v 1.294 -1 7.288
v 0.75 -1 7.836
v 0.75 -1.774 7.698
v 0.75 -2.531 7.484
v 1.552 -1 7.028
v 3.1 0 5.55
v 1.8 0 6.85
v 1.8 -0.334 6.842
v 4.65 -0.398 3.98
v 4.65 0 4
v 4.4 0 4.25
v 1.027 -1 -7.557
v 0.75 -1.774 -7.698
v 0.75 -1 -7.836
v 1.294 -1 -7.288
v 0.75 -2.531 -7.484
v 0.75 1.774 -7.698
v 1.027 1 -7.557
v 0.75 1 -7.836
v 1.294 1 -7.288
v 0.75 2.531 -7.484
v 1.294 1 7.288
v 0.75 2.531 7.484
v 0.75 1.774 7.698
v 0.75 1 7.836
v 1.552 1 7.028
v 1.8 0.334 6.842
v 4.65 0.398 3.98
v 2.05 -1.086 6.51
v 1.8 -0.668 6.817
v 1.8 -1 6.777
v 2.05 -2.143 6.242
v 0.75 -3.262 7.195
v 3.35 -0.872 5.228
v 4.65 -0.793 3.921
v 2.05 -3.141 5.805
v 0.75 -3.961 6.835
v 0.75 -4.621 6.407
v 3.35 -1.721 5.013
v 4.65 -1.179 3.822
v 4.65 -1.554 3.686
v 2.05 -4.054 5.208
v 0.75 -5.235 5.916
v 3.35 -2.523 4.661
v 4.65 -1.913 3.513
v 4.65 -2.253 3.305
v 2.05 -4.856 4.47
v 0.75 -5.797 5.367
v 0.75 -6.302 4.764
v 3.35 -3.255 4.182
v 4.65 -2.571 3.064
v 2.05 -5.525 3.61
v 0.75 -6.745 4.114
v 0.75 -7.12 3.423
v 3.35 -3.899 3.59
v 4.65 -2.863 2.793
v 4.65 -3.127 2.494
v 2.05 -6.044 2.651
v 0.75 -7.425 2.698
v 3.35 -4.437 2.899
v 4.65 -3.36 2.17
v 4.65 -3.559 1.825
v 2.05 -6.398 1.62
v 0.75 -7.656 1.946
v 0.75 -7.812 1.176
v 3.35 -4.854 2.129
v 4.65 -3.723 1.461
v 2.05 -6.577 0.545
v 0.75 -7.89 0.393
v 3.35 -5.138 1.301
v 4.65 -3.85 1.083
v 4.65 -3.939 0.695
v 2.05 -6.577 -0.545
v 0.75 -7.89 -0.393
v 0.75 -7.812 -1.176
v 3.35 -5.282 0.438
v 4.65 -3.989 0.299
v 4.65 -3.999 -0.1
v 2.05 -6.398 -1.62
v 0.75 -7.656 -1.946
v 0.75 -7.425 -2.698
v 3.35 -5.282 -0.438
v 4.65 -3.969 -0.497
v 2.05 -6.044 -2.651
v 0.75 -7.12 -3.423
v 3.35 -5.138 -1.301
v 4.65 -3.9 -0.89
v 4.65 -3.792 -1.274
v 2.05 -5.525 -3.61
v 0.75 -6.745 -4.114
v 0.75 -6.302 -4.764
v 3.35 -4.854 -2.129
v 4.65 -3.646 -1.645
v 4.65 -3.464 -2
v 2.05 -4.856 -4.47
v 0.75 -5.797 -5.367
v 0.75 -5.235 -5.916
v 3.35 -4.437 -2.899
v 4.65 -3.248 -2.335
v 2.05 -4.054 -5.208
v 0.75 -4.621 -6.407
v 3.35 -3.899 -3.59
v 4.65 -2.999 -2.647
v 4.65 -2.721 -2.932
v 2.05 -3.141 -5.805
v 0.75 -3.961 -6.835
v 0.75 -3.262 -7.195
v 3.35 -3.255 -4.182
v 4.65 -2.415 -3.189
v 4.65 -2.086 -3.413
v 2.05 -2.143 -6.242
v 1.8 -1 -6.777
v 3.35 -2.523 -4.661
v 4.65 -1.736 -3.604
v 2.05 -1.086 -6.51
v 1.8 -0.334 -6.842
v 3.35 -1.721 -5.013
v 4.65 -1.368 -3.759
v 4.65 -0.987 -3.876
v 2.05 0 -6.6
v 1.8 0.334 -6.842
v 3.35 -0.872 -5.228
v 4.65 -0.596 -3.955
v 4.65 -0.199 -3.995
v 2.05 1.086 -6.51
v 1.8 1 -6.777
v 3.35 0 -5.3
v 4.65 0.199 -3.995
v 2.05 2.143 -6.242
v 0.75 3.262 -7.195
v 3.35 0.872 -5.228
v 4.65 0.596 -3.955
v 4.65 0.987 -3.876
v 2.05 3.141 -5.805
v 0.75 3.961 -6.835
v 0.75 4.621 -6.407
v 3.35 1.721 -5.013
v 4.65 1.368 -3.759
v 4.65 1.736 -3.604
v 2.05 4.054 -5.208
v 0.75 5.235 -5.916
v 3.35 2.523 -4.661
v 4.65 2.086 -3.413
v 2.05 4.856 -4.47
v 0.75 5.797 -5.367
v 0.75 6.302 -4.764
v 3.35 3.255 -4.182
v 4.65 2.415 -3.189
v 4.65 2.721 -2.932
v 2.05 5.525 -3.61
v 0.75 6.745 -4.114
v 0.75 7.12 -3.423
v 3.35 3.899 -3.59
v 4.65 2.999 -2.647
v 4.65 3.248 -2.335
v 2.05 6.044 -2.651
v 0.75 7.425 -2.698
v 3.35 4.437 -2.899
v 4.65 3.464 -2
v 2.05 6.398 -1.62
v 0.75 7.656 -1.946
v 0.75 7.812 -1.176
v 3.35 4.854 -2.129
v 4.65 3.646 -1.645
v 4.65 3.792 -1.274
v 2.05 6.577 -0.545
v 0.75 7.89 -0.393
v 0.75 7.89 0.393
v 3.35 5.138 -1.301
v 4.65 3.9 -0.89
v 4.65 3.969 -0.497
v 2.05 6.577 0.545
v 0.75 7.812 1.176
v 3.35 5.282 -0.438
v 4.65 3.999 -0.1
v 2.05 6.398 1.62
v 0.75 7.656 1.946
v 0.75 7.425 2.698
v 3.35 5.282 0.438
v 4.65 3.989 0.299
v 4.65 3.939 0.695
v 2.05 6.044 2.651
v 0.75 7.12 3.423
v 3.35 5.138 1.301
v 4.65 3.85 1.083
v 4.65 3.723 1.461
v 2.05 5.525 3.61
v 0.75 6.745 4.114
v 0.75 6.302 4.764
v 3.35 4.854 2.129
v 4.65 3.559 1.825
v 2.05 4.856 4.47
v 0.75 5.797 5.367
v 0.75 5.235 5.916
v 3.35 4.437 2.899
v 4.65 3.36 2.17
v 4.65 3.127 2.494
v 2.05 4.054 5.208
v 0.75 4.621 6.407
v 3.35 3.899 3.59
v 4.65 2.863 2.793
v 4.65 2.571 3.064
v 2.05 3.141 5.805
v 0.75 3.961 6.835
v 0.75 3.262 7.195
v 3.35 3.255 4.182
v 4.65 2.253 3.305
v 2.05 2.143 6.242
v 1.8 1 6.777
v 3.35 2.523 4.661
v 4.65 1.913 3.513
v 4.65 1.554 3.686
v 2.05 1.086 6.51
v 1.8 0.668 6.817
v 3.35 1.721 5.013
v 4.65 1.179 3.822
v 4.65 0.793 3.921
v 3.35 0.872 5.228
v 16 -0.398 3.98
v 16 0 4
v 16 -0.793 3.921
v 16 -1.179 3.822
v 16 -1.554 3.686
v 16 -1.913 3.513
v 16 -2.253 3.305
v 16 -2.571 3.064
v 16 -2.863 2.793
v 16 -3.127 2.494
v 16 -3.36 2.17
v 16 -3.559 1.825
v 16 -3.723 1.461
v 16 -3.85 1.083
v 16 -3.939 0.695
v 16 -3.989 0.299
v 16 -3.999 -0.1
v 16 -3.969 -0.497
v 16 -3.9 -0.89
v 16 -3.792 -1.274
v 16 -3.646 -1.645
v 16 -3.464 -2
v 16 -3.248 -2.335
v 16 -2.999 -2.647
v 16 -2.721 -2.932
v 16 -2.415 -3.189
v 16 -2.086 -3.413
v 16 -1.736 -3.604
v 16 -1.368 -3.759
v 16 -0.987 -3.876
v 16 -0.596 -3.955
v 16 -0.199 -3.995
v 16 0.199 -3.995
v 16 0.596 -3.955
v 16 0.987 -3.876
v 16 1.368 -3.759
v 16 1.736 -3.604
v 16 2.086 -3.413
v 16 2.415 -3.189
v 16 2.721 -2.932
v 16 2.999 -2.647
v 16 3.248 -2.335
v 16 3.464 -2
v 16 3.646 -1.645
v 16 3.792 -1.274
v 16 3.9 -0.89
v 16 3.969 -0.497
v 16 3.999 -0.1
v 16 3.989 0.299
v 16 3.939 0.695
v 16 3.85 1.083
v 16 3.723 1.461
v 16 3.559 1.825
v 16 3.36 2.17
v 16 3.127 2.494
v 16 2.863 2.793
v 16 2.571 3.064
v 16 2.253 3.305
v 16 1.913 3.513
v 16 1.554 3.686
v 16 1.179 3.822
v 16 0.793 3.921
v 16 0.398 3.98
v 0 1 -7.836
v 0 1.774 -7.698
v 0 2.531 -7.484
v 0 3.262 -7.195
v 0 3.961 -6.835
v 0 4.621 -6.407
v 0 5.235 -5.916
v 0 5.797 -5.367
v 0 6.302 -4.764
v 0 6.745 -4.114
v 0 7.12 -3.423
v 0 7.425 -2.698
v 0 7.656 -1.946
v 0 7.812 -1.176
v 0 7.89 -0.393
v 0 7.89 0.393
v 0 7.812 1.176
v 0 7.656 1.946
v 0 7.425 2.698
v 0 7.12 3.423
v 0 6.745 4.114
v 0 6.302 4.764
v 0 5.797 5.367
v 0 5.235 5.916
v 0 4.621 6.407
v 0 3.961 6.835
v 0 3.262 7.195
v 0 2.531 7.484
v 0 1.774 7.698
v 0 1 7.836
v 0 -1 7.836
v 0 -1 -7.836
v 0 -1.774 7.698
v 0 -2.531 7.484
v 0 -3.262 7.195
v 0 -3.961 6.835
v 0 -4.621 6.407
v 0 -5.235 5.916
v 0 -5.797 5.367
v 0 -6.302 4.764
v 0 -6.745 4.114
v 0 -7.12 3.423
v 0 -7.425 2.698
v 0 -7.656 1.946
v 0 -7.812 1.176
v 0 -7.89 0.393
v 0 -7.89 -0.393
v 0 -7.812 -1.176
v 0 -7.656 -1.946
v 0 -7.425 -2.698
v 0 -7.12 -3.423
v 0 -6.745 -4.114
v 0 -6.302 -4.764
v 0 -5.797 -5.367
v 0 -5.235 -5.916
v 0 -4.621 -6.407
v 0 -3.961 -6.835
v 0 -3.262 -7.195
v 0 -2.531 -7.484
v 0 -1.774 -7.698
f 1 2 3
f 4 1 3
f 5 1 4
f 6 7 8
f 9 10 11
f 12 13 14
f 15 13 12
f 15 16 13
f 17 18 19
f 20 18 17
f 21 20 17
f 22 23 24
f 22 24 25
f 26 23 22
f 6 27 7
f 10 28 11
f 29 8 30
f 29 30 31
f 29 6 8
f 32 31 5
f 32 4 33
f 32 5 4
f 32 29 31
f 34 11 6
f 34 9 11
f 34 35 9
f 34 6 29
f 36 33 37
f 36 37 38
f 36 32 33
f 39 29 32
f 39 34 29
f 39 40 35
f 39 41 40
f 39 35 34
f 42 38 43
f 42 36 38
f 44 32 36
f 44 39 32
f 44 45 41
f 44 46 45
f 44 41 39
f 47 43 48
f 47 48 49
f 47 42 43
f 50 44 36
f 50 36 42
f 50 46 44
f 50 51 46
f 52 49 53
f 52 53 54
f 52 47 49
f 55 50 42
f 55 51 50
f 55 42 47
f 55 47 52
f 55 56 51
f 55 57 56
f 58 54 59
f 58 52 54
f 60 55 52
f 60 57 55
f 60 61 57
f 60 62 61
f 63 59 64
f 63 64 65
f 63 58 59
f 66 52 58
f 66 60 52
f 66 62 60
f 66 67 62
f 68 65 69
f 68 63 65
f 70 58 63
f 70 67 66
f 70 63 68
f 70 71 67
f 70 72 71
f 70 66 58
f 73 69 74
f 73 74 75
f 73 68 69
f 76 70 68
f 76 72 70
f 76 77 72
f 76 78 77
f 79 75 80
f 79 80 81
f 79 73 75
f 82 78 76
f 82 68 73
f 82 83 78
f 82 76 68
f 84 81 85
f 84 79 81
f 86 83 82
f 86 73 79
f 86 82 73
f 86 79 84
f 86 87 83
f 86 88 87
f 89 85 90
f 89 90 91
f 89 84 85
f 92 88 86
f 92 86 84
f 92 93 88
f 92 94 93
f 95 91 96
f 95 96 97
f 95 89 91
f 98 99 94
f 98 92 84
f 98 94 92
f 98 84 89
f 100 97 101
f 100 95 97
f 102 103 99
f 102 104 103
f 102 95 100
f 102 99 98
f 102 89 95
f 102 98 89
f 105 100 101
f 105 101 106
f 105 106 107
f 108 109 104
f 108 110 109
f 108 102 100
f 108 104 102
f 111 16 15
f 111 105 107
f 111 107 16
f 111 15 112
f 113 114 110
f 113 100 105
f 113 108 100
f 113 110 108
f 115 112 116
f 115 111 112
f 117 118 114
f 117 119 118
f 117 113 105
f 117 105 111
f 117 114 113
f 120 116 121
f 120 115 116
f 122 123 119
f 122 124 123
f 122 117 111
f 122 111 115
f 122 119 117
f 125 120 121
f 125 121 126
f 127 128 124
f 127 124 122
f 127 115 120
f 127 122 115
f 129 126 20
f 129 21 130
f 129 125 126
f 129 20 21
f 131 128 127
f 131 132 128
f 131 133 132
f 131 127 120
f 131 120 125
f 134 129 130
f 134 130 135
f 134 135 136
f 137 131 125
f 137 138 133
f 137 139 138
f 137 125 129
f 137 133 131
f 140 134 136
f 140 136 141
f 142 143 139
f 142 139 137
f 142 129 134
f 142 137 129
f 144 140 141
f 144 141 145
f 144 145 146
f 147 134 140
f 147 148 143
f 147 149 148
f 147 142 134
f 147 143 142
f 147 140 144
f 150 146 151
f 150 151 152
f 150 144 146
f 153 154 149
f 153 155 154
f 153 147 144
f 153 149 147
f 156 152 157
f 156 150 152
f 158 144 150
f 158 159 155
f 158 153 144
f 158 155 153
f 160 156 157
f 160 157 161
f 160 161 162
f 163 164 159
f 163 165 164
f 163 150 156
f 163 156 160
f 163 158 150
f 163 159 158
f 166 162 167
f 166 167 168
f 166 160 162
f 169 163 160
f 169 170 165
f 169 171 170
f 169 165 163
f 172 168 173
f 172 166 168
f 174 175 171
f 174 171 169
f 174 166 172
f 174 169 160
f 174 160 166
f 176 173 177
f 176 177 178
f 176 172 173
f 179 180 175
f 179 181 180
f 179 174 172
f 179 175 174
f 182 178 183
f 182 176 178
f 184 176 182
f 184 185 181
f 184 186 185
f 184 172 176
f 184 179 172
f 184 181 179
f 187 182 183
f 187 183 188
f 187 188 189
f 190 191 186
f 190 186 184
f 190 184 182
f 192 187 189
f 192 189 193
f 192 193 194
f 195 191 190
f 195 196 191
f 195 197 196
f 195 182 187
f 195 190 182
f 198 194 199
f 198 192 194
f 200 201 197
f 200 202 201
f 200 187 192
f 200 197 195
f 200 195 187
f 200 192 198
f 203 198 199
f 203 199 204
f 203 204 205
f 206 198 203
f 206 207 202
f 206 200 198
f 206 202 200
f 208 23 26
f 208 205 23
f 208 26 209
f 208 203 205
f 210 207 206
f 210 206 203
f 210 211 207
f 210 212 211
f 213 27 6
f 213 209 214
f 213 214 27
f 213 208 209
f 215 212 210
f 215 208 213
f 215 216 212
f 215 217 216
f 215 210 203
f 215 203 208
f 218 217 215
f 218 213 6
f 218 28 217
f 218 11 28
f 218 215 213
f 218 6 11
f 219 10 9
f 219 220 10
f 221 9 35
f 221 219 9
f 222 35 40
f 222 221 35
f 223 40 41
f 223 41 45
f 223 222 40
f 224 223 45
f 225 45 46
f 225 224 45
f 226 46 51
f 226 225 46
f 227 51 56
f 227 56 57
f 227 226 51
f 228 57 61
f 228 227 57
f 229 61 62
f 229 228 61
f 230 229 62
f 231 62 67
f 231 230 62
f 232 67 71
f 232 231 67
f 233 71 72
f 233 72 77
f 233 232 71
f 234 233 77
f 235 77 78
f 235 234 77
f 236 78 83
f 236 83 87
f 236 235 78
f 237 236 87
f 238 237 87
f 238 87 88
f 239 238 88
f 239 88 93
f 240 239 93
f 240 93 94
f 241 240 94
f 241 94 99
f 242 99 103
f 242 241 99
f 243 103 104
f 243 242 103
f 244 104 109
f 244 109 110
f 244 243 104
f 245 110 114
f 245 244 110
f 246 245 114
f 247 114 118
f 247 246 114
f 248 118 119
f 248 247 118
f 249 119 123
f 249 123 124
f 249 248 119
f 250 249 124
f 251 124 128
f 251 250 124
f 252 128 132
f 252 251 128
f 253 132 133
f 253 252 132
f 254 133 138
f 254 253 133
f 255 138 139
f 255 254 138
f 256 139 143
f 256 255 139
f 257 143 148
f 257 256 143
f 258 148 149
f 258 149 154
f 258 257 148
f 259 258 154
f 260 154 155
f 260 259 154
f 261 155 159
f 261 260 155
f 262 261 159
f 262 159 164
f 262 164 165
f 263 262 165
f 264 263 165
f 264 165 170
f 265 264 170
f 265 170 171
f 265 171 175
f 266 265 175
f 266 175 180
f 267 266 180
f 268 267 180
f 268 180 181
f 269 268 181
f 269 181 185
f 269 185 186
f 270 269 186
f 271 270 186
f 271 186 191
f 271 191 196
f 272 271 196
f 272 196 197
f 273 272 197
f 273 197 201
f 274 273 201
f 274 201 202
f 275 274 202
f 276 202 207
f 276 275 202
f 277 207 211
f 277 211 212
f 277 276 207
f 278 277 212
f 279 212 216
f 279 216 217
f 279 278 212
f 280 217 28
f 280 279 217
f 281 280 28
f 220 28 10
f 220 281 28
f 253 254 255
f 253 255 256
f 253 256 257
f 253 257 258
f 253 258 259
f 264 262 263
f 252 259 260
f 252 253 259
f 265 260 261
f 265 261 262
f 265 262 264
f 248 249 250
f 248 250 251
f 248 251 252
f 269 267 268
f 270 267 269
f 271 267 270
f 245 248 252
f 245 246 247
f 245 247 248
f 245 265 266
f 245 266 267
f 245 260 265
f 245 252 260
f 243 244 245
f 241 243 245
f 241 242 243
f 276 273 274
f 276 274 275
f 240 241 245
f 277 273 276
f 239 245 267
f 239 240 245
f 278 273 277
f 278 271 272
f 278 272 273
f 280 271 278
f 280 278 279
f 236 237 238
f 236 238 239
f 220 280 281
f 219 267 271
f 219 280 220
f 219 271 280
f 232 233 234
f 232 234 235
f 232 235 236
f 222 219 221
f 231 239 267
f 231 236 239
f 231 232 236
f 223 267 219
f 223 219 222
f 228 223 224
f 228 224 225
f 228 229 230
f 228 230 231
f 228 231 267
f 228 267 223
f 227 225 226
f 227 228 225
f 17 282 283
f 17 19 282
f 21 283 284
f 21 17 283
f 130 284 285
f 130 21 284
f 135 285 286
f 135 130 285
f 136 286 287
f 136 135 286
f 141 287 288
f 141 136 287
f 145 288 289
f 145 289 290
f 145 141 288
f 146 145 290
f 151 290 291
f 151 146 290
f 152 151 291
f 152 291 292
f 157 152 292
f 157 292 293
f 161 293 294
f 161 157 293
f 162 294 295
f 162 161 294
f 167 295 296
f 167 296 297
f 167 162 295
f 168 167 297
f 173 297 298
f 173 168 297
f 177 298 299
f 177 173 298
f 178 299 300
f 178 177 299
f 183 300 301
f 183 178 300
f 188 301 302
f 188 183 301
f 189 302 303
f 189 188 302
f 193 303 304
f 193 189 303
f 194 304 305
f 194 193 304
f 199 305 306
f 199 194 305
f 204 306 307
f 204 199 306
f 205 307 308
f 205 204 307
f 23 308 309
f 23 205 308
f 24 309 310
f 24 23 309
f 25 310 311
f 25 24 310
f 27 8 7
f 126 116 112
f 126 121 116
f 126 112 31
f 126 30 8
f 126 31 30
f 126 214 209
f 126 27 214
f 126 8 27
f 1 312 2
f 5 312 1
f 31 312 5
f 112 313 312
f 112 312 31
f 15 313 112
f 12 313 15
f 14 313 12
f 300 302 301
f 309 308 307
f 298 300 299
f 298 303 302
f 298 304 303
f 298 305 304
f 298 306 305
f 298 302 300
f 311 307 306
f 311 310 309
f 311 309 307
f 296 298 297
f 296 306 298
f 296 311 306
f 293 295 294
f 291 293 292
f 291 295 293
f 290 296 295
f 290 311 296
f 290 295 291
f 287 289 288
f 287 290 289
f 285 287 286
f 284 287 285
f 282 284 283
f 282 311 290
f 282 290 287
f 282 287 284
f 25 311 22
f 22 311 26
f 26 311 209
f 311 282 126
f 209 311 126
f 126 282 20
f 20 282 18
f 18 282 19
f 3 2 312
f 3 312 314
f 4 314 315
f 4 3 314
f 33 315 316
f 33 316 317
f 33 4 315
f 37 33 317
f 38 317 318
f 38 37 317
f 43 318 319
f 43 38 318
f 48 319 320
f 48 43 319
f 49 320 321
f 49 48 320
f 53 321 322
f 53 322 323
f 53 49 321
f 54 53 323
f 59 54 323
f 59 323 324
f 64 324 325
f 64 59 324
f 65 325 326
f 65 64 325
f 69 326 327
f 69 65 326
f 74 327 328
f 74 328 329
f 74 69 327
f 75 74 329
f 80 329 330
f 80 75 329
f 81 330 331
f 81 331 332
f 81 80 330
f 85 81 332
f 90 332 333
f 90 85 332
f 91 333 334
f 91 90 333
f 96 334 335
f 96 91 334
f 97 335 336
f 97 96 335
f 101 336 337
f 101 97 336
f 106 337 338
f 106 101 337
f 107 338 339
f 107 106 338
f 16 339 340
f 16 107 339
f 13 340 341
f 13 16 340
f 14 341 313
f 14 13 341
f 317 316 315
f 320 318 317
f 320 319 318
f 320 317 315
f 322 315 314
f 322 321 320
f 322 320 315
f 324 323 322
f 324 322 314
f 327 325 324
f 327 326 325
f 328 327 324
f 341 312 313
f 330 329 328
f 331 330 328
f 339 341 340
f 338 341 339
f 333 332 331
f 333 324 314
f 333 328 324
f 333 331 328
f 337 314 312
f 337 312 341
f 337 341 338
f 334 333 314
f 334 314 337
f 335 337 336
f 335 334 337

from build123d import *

# Parameters (mm, degrees)
CUT_EXTRUDE_1_DEPTH      = 20.514609912
CUT_EXTRUDE_1_DEPTH_BACK = 20.514609912
SKETCH_2_W               = 2.289640131
SKETCH_2_H               = 2


with BuildPart() as part:
    # 草图1 → 旋转1 (revolve)
    with BuildSketch(Plane.XY, mode=Mode.PRIVATE) as revolve_1_sk:
        Polygon((0, 0), (0, 7.9), (0.75, 7.9), (4.65, 4), (16, 4), (16, 0), align=None)
    revolve(revolve_1_sk.sketch.rotate(Axis((-3.228581577, 0, 0), (1, 0, 0)), 90), axis=Axis((-3.228581577, 0, 0), (1, 0, 0)))

    # 草图2 → 切除-拉伸1 (cut, two sides: drawn at the far end of the back side and taken through both)
    with BuildSketch(Plane.XY.offset(-CUT_EXTRUDE_1_DEPTH_BACK)):
        with Locations((0.655179935, 0)):
            Rectangle(SKETCH_2_W, SKETCH_2_H)
    extrude(amount=CUT_EXTRUDE_1_DEPTH + CUT_EXTRUDE_1_DEPTH_BACK, mode=Mode.SUBTRACT)


solid = part.part
